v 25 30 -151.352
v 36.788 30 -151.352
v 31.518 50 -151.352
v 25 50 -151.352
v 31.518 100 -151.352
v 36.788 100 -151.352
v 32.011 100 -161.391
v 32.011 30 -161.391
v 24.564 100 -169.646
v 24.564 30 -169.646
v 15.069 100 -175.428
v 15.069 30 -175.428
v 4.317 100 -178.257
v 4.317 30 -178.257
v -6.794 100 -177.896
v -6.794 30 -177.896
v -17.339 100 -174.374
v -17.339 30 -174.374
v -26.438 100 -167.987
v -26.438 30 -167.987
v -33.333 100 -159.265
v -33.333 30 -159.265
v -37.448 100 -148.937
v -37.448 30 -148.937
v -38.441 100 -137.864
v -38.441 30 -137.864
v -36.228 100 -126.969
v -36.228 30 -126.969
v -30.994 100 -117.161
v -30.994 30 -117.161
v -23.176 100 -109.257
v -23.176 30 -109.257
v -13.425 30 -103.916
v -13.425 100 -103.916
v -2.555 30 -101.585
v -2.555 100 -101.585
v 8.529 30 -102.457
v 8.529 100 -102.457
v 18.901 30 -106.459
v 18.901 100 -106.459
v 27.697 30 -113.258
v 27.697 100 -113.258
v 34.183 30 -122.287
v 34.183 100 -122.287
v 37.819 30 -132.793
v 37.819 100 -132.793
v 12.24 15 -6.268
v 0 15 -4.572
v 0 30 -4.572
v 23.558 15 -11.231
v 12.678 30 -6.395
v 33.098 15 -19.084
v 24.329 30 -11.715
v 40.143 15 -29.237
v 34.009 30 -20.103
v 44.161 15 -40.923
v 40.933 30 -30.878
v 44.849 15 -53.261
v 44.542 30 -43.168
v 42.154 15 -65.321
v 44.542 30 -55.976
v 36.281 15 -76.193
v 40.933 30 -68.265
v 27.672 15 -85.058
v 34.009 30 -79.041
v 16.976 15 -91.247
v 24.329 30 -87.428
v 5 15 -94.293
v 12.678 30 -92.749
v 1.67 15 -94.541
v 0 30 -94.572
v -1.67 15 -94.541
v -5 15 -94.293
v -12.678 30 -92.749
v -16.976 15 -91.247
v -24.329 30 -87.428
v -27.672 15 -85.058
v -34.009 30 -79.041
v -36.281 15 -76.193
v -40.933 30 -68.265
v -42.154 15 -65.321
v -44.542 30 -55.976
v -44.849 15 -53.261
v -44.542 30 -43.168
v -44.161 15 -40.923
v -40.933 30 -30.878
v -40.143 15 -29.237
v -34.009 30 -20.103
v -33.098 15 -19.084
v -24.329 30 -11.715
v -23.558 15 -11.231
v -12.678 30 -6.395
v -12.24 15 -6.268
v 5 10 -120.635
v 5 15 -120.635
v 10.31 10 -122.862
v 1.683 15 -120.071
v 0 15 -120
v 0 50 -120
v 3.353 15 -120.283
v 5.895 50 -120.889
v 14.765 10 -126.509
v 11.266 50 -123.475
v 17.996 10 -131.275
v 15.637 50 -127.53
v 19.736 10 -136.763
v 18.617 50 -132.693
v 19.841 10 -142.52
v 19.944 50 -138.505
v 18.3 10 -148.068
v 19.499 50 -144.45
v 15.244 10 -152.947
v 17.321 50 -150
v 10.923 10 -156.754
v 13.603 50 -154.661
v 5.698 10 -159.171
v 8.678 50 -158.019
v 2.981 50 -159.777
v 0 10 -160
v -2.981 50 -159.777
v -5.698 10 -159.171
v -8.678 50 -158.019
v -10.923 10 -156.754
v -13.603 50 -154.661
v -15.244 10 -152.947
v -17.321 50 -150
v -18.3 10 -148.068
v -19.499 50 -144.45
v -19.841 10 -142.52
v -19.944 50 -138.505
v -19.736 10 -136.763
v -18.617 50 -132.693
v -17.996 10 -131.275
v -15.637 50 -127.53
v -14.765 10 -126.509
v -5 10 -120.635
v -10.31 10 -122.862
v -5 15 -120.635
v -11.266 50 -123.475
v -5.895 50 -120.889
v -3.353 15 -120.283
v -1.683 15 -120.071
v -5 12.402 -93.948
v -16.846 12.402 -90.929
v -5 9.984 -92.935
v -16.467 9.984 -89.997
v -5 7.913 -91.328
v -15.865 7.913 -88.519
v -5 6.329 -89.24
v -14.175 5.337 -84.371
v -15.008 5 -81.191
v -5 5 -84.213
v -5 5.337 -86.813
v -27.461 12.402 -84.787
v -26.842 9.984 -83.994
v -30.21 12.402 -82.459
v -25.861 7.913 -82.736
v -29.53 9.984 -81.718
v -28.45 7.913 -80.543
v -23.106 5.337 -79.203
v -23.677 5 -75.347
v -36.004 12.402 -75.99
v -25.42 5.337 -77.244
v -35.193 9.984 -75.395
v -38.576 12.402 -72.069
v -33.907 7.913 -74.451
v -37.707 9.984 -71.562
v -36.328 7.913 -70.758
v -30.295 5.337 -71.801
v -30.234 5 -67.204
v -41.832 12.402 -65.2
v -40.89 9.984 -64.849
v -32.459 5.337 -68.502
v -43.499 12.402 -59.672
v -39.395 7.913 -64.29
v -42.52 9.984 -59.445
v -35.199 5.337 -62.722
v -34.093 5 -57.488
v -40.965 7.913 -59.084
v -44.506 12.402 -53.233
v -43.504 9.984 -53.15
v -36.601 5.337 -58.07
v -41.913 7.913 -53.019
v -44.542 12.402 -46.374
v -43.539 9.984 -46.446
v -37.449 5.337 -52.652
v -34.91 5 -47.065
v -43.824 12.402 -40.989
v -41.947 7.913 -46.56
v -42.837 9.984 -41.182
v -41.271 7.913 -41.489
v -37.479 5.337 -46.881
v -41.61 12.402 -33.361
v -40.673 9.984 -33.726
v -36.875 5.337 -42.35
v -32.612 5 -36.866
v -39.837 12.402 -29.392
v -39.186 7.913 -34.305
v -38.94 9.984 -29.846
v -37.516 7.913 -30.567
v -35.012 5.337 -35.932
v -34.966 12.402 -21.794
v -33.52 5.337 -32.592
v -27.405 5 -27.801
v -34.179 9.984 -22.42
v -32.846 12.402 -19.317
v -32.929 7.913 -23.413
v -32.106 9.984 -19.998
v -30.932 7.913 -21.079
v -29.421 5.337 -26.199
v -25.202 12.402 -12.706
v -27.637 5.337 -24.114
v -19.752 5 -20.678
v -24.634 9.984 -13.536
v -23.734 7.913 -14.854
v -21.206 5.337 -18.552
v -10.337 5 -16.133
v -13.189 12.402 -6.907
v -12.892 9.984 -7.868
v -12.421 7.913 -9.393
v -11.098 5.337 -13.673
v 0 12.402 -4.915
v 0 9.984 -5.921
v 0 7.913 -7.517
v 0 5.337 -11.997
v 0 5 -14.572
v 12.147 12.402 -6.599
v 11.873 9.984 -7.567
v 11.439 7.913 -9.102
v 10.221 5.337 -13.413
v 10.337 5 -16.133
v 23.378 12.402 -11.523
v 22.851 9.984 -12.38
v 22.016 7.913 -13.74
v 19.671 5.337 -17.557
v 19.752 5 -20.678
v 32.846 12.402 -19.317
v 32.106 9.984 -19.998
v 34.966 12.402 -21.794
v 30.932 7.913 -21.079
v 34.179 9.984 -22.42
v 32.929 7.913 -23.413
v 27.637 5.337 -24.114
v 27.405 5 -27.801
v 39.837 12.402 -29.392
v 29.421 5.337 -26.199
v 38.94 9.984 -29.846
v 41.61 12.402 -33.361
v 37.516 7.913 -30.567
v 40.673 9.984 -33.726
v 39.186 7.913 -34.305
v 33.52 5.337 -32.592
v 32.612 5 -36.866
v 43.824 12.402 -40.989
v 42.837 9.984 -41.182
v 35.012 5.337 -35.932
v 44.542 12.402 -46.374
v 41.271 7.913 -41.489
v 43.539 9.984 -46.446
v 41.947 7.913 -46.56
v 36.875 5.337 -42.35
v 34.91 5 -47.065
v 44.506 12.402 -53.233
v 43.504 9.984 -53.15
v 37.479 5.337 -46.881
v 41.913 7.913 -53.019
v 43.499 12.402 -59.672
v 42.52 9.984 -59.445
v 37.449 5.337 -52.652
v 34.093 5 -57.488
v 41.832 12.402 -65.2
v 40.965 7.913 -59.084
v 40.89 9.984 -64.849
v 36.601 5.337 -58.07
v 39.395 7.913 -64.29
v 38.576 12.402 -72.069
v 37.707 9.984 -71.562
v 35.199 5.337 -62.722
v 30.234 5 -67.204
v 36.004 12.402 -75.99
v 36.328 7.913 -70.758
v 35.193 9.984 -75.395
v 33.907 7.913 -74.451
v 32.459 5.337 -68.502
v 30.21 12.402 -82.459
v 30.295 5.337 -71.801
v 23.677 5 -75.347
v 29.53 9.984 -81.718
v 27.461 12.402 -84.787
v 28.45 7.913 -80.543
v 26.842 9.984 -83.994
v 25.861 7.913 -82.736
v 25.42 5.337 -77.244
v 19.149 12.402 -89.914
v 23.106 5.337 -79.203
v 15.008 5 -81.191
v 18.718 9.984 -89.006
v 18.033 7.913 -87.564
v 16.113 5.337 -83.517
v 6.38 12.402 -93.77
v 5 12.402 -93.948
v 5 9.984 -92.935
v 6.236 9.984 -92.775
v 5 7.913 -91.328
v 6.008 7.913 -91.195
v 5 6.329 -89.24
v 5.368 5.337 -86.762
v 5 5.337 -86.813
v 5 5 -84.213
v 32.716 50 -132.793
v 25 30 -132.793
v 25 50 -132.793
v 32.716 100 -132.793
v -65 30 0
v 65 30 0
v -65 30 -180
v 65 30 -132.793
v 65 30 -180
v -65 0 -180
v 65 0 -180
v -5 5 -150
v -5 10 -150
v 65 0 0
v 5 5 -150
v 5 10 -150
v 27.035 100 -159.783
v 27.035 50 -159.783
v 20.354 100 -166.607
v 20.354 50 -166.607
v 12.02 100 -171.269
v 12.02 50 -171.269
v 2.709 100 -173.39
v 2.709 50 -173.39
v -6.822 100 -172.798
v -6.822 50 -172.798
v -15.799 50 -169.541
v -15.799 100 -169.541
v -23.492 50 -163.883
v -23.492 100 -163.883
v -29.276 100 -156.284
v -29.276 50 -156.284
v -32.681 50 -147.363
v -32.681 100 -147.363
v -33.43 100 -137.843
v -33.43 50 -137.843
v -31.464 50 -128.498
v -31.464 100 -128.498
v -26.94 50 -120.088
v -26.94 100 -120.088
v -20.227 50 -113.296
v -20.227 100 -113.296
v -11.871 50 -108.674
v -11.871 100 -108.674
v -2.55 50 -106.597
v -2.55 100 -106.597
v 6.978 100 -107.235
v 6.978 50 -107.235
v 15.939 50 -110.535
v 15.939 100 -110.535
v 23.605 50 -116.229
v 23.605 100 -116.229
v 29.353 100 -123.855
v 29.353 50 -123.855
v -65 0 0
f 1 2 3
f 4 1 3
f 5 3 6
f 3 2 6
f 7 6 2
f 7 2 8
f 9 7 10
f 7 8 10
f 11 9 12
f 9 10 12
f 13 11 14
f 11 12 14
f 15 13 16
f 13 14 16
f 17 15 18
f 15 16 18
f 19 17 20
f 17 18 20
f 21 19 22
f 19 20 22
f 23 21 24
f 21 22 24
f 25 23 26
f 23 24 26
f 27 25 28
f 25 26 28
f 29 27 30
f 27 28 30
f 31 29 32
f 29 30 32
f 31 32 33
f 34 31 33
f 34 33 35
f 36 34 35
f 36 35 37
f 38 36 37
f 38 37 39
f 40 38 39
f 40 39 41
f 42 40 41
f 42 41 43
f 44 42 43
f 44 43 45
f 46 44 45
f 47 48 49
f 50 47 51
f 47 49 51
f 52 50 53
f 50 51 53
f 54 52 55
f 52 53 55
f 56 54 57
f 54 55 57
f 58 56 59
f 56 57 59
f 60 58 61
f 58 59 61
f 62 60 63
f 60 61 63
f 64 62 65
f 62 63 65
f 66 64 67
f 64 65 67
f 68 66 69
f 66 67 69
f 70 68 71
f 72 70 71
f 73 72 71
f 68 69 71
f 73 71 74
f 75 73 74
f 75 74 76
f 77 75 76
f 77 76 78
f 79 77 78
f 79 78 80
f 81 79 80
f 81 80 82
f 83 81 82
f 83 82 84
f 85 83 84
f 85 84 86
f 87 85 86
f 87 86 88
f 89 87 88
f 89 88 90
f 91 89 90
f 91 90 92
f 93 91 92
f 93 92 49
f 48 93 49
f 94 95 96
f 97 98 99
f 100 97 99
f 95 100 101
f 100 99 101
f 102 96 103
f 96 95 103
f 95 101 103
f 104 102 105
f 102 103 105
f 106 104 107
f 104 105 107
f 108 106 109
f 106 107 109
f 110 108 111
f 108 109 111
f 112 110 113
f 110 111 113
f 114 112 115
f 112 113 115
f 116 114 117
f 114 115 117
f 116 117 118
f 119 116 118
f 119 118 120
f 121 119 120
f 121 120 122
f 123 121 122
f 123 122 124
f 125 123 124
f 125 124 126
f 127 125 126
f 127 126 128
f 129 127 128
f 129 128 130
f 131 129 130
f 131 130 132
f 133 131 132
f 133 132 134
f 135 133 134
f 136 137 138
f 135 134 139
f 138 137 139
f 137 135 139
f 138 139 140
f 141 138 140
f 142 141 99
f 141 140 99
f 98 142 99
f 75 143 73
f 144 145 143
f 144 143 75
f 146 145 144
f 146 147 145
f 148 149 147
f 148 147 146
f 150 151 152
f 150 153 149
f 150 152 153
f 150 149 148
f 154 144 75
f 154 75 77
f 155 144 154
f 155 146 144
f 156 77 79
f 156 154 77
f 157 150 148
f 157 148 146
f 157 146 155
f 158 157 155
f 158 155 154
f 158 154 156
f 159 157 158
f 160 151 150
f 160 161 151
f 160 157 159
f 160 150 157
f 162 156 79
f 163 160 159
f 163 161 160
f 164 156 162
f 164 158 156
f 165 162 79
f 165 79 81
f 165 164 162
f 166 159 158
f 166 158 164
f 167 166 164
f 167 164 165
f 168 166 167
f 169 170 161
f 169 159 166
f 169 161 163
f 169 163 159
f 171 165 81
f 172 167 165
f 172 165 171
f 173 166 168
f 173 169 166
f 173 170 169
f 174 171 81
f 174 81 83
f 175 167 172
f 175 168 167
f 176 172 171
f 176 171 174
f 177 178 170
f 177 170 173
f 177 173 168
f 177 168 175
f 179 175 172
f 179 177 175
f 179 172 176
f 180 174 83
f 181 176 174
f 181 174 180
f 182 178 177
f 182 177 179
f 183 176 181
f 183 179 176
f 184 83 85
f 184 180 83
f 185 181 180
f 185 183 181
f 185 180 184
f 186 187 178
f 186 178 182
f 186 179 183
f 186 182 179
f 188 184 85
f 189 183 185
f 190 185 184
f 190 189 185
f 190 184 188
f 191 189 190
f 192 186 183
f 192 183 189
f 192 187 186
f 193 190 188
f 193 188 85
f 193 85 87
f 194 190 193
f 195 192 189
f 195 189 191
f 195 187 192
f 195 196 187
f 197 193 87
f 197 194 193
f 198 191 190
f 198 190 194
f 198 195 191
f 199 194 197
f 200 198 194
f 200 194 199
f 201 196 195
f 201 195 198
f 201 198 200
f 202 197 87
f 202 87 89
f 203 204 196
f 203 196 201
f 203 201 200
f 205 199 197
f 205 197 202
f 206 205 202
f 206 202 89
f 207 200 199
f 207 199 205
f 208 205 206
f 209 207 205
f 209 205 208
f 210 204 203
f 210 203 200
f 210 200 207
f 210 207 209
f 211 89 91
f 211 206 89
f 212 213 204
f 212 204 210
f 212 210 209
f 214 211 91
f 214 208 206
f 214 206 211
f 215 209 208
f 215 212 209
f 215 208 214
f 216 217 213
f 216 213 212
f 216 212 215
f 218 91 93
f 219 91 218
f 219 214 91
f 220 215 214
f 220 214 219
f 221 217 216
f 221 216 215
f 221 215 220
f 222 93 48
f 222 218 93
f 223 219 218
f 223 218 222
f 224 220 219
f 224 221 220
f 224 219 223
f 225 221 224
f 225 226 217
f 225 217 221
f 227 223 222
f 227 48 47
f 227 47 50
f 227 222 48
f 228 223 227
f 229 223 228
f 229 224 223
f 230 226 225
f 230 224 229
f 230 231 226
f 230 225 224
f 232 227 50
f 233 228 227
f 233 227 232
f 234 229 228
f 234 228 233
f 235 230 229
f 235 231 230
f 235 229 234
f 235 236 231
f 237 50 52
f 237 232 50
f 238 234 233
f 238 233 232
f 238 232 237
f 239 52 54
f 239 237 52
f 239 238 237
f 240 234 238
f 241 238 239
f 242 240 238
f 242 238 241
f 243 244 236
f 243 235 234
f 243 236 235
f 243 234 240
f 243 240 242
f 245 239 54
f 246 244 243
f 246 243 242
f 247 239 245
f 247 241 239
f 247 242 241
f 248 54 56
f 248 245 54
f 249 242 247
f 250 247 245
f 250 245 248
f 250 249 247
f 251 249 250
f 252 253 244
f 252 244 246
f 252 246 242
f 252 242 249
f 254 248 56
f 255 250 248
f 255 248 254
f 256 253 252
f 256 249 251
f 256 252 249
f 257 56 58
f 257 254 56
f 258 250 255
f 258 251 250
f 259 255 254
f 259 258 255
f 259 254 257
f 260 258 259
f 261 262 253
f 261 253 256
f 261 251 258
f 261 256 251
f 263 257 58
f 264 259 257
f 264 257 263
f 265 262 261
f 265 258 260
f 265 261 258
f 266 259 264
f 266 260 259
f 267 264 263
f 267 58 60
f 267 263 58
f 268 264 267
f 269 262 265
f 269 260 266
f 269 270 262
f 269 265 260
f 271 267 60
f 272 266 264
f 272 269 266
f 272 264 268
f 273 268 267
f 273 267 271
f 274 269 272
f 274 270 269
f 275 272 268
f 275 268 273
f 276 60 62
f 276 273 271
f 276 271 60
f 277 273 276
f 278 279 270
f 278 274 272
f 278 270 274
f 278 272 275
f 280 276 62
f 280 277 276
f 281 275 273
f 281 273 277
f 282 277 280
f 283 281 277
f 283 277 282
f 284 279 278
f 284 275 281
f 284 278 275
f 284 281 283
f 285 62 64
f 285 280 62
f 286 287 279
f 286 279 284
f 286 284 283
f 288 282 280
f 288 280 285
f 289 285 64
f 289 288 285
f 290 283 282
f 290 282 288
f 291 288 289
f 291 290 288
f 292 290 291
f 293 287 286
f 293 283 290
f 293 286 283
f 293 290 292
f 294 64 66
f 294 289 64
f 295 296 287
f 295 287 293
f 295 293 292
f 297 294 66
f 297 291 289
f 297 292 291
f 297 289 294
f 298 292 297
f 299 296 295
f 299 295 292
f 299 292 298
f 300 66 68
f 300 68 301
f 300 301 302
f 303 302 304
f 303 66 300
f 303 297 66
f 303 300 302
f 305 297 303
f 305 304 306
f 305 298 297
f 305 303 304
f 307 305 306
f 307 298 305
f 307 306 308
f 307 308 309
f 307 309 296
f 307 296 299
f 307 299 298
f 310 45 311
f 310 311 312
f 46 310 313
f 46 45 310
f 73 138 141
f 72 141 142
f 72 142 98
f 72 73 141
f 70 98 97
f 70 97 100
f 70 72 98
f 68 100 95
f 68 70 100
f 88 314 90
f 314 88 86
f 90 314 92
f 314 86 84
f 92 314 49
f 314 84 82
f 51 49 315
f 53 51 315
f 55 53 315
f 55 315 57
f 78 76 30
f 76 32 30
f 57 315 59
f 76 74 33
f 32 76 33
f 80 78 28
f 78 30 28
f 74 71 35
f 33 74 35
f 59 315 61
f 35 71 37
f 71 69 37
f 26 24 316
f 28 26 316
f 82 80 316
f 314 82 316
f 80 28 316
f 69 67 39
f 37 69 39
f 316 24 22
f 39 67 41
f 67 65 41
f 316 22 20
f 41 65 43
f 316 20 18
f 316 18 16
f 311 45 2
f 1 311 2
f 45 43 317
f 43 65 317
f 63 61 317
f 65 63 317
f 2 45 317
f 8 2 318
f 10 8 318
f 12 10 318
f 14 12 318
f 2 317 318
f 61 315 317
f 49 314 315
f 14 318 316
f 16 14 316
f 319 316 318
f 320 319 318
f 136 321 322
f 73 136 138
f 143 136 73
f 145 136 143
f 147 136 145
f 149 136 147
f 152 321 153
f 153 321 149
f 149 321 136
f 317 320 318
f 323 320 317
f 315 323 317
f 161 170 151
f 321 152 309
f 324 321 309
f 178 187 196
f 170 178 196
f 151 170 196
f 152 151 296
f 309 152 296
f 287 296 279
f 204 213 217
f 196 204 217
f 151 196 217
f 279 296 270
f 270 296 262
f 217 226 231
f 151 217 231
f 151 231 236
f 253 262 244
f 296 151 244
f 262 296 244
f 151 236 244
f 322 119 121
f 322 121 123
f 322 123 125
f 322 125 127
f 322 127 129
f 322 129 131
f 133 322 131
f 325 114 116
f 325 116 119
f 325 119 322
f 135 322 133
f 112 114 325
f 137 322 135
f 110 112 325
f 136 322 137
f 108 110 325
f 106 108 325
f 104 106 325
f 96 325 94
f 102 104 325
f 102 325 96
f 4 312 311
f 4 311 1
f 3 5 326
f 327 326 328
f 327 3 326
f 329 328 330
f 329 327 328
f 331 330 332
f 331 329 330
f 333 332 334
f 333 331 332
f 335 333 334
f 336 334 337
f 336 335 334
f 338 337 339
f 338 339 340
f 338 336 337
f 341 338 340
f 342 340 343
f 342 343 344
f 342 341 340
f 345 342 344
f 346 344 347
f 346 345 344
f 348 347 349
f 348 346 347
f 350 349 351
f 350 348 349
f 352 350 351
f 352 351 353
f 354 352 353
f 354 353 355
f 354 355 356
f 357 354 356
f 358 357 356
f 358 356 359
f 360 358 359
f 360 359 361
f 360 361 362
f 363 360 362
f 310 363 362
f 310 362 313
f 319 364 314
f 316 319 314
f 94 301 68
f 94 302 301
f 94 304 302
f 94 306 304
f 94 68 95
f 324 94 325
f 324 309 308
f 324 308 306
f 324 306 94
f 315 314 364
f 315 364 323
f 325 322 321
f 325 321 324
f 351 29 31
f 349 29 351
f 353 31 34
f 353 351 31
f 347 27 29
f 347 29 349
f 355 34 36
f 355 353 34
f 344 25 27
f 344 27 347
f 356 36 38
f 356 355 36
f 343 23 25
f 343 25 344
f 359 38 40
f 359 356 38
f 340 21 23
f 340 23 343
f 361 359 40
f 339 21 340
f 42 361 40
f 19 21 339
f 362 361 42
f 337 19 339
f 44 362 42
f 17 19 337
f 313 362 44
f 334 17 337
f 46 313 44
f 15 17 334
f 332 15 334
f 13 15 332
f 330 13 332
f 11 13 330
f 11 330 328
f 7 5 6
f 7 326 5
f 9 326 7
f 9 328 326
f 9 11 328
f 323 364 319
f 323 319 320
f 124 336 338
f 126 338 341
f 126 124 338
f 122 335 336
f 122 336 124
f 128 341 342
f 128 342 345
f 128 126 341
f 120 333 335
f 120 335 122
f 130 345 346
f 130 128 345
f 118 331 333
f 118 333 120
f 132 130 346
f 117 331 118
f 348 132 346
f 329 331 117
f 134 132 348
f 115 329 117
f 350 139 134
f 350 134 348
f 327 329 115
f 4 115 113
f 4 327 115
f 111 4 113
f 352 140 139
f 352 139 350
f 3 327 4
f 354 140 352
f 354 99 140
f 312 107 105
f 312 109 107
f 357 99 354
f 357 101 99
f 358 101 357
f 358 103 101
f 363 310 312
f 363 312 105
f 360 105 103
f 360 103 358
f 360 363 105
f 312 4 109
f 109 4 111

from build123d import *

# Parameters (mm, degrees)
SKETCH_1_W          = 130
SKETCH_1_H          = 30
EXTRUDE_1_DEPTH     = 180
SKETCH_2_R          = 38.5
SKETCH_2_R_2        = 33.5
EXTRUDE_1_2_DEPTH   = 70
SKETCH_3_R          = 45
CUT_EXTRUDE_1_DEPTH = 25
SKETCH_5_R          = 33.5
EXTRUDE_2_DEPTH     = 20
SKETCH_4_R          = 20
CUT_EXTRUDE_2_DEPTH = 40
SKETCH_7_W          = 10
SKETCH_7_H          = 10
CUT_EXTRUDE_3_DEPTH = 130
SKETCH_8_W          = 18.558998623
SKETCH_8_H          = 76.555219483
CUT_EXTRUDE_4_DEPTH = 40
FILLET_START        = 5
FILLET_1_2_DEPTH    = 10


with BuildPart() as part:
    # 草图1 → Extrude 1 (new body)
    with BuildSketch(Plane.XY):
        with Locations((0, 15)):
            Rectangle(SKETCH_1_W, SKETCH_1_H)
    extrude(amount=-EXTRUDE_1_DEPTH)

    # 草图2 → Extrude 1 2 (add)
    with BuildSketch(Plane(origin=(0, 30, 0), x_dir=(1, 0, 0), z_dir=(0, 1, 0))):
        with Locations((0, 140)):
            Circle(SKETCH_2_R)
        with Locations((0, 140)):
            Circle(SKETCH_2_R_2, mode=Mode.SUBTRACT)
    extrude(amount=EXTRUDE_1_2_DEPTH)

    # 草图3 → 切除-拉伸1 (cut)
    with BuildSketch(Plane(origin=(0, 30, 0), x_dir=(1, 0, 0), z_dir=(0, 1, 0))):
        with Locations(Location((0, 49.571769675, 0), (0, 0, 270))):
            Circle(SKETCH_3_R)
    extrude(amount=-CUT_EXTRUDE_1_DEPTH, mode=Mode.SUBTRACT)

    # 草图5 → 凸台-拉伸2 (add)
    with BuildSketch(Plane(origin=(0, 30, 0), x_dir=(1, 0, 0), z_dir=(0, 1, 0))):
        with Locations(Location((0, 140, 0), (0, 0, 270))):
            Circle(SKETCH_5_R)
    extrude(amount=EXTRUDE_2_DEPTH)

    # 草图4 → 切除-拉伸2 (cut)
    with BuildSketch(Plane(origin=(0, 50, 0), x_dir=(1, 0, 0), z_dir=(0, 1, 0))):
        with Locations(Location((0, 140, 0), (0, 0, 270))):
            Circle(SKETCH_4_R)
    extrude(amount=-CUT_EXTRUDE_2_DEPTH, mode=Mode.SUBTRACT)

    # 草图7 → 切除-拉伸3 (cut)
    with BuildSketch(Plane.XY.offset(-20)):
        with Locations((0, 10)):
            Rectangle(SKETCH_7_W, SKETCH_7_H)
    extrude(amount=-CUT_EXTRUDE_3_DEPTH, mode=Mode.SUBTRACT)

    # 草图8 → 切除-拉伸4 (cut)
    with BuildSketch(Plane(origin=(65, 0, 0), x_dir=(0, 0, -1), z_dir=(1, 0, 0))):
        with Locations((142.072443273, 68.277609742)):
            Rectangle(SKETCH_8_W, SKETCH_8_H)
    extrude(amount=-CUT_EXTRUDE_4_DEPTH, mode=Mode.SUBTRACT)

    # 圆角1: read off the stored shape, not the designer's step
    # 圆角1 outline → 圆角1 (revolve)
    with BuildSketch(Plane.XY.offset(-49.571769675)):
        with BuildLine():
            ThreePointArc((45, 15), (42.071067812, 7.928932188), (35, 5))
            Line((35, 5), (45, 5))
            Line((45, 5), (45, 15))
        make_face()
    revolve(axis=Axis((0, 0, -49.571769675), (0, 1, 0)))

    # Fillet 1 2 outline → Fillet 1 2 (cut)
    with BuildSketch(Plane(origin=(0, 0, 0), x_dir=(1, 0, 0), z_dir=(0, 1, 0)).offset(FILLET_START)):
        with BuildLine():
            Line((-5, 150), (-5, 84.212785827))
            ThreePointArc((-5, 84.212785827), (0, 14.571769675), (5, 84.212785827))
            Line((5, 84.212785827), (5, 150))
            Line((5, 150), (-5, 150))
        make_face()
    extrude(amount=FILLET_1_2_DEPTH, mode=Mode.SUBTRACT)


solid = part.part
